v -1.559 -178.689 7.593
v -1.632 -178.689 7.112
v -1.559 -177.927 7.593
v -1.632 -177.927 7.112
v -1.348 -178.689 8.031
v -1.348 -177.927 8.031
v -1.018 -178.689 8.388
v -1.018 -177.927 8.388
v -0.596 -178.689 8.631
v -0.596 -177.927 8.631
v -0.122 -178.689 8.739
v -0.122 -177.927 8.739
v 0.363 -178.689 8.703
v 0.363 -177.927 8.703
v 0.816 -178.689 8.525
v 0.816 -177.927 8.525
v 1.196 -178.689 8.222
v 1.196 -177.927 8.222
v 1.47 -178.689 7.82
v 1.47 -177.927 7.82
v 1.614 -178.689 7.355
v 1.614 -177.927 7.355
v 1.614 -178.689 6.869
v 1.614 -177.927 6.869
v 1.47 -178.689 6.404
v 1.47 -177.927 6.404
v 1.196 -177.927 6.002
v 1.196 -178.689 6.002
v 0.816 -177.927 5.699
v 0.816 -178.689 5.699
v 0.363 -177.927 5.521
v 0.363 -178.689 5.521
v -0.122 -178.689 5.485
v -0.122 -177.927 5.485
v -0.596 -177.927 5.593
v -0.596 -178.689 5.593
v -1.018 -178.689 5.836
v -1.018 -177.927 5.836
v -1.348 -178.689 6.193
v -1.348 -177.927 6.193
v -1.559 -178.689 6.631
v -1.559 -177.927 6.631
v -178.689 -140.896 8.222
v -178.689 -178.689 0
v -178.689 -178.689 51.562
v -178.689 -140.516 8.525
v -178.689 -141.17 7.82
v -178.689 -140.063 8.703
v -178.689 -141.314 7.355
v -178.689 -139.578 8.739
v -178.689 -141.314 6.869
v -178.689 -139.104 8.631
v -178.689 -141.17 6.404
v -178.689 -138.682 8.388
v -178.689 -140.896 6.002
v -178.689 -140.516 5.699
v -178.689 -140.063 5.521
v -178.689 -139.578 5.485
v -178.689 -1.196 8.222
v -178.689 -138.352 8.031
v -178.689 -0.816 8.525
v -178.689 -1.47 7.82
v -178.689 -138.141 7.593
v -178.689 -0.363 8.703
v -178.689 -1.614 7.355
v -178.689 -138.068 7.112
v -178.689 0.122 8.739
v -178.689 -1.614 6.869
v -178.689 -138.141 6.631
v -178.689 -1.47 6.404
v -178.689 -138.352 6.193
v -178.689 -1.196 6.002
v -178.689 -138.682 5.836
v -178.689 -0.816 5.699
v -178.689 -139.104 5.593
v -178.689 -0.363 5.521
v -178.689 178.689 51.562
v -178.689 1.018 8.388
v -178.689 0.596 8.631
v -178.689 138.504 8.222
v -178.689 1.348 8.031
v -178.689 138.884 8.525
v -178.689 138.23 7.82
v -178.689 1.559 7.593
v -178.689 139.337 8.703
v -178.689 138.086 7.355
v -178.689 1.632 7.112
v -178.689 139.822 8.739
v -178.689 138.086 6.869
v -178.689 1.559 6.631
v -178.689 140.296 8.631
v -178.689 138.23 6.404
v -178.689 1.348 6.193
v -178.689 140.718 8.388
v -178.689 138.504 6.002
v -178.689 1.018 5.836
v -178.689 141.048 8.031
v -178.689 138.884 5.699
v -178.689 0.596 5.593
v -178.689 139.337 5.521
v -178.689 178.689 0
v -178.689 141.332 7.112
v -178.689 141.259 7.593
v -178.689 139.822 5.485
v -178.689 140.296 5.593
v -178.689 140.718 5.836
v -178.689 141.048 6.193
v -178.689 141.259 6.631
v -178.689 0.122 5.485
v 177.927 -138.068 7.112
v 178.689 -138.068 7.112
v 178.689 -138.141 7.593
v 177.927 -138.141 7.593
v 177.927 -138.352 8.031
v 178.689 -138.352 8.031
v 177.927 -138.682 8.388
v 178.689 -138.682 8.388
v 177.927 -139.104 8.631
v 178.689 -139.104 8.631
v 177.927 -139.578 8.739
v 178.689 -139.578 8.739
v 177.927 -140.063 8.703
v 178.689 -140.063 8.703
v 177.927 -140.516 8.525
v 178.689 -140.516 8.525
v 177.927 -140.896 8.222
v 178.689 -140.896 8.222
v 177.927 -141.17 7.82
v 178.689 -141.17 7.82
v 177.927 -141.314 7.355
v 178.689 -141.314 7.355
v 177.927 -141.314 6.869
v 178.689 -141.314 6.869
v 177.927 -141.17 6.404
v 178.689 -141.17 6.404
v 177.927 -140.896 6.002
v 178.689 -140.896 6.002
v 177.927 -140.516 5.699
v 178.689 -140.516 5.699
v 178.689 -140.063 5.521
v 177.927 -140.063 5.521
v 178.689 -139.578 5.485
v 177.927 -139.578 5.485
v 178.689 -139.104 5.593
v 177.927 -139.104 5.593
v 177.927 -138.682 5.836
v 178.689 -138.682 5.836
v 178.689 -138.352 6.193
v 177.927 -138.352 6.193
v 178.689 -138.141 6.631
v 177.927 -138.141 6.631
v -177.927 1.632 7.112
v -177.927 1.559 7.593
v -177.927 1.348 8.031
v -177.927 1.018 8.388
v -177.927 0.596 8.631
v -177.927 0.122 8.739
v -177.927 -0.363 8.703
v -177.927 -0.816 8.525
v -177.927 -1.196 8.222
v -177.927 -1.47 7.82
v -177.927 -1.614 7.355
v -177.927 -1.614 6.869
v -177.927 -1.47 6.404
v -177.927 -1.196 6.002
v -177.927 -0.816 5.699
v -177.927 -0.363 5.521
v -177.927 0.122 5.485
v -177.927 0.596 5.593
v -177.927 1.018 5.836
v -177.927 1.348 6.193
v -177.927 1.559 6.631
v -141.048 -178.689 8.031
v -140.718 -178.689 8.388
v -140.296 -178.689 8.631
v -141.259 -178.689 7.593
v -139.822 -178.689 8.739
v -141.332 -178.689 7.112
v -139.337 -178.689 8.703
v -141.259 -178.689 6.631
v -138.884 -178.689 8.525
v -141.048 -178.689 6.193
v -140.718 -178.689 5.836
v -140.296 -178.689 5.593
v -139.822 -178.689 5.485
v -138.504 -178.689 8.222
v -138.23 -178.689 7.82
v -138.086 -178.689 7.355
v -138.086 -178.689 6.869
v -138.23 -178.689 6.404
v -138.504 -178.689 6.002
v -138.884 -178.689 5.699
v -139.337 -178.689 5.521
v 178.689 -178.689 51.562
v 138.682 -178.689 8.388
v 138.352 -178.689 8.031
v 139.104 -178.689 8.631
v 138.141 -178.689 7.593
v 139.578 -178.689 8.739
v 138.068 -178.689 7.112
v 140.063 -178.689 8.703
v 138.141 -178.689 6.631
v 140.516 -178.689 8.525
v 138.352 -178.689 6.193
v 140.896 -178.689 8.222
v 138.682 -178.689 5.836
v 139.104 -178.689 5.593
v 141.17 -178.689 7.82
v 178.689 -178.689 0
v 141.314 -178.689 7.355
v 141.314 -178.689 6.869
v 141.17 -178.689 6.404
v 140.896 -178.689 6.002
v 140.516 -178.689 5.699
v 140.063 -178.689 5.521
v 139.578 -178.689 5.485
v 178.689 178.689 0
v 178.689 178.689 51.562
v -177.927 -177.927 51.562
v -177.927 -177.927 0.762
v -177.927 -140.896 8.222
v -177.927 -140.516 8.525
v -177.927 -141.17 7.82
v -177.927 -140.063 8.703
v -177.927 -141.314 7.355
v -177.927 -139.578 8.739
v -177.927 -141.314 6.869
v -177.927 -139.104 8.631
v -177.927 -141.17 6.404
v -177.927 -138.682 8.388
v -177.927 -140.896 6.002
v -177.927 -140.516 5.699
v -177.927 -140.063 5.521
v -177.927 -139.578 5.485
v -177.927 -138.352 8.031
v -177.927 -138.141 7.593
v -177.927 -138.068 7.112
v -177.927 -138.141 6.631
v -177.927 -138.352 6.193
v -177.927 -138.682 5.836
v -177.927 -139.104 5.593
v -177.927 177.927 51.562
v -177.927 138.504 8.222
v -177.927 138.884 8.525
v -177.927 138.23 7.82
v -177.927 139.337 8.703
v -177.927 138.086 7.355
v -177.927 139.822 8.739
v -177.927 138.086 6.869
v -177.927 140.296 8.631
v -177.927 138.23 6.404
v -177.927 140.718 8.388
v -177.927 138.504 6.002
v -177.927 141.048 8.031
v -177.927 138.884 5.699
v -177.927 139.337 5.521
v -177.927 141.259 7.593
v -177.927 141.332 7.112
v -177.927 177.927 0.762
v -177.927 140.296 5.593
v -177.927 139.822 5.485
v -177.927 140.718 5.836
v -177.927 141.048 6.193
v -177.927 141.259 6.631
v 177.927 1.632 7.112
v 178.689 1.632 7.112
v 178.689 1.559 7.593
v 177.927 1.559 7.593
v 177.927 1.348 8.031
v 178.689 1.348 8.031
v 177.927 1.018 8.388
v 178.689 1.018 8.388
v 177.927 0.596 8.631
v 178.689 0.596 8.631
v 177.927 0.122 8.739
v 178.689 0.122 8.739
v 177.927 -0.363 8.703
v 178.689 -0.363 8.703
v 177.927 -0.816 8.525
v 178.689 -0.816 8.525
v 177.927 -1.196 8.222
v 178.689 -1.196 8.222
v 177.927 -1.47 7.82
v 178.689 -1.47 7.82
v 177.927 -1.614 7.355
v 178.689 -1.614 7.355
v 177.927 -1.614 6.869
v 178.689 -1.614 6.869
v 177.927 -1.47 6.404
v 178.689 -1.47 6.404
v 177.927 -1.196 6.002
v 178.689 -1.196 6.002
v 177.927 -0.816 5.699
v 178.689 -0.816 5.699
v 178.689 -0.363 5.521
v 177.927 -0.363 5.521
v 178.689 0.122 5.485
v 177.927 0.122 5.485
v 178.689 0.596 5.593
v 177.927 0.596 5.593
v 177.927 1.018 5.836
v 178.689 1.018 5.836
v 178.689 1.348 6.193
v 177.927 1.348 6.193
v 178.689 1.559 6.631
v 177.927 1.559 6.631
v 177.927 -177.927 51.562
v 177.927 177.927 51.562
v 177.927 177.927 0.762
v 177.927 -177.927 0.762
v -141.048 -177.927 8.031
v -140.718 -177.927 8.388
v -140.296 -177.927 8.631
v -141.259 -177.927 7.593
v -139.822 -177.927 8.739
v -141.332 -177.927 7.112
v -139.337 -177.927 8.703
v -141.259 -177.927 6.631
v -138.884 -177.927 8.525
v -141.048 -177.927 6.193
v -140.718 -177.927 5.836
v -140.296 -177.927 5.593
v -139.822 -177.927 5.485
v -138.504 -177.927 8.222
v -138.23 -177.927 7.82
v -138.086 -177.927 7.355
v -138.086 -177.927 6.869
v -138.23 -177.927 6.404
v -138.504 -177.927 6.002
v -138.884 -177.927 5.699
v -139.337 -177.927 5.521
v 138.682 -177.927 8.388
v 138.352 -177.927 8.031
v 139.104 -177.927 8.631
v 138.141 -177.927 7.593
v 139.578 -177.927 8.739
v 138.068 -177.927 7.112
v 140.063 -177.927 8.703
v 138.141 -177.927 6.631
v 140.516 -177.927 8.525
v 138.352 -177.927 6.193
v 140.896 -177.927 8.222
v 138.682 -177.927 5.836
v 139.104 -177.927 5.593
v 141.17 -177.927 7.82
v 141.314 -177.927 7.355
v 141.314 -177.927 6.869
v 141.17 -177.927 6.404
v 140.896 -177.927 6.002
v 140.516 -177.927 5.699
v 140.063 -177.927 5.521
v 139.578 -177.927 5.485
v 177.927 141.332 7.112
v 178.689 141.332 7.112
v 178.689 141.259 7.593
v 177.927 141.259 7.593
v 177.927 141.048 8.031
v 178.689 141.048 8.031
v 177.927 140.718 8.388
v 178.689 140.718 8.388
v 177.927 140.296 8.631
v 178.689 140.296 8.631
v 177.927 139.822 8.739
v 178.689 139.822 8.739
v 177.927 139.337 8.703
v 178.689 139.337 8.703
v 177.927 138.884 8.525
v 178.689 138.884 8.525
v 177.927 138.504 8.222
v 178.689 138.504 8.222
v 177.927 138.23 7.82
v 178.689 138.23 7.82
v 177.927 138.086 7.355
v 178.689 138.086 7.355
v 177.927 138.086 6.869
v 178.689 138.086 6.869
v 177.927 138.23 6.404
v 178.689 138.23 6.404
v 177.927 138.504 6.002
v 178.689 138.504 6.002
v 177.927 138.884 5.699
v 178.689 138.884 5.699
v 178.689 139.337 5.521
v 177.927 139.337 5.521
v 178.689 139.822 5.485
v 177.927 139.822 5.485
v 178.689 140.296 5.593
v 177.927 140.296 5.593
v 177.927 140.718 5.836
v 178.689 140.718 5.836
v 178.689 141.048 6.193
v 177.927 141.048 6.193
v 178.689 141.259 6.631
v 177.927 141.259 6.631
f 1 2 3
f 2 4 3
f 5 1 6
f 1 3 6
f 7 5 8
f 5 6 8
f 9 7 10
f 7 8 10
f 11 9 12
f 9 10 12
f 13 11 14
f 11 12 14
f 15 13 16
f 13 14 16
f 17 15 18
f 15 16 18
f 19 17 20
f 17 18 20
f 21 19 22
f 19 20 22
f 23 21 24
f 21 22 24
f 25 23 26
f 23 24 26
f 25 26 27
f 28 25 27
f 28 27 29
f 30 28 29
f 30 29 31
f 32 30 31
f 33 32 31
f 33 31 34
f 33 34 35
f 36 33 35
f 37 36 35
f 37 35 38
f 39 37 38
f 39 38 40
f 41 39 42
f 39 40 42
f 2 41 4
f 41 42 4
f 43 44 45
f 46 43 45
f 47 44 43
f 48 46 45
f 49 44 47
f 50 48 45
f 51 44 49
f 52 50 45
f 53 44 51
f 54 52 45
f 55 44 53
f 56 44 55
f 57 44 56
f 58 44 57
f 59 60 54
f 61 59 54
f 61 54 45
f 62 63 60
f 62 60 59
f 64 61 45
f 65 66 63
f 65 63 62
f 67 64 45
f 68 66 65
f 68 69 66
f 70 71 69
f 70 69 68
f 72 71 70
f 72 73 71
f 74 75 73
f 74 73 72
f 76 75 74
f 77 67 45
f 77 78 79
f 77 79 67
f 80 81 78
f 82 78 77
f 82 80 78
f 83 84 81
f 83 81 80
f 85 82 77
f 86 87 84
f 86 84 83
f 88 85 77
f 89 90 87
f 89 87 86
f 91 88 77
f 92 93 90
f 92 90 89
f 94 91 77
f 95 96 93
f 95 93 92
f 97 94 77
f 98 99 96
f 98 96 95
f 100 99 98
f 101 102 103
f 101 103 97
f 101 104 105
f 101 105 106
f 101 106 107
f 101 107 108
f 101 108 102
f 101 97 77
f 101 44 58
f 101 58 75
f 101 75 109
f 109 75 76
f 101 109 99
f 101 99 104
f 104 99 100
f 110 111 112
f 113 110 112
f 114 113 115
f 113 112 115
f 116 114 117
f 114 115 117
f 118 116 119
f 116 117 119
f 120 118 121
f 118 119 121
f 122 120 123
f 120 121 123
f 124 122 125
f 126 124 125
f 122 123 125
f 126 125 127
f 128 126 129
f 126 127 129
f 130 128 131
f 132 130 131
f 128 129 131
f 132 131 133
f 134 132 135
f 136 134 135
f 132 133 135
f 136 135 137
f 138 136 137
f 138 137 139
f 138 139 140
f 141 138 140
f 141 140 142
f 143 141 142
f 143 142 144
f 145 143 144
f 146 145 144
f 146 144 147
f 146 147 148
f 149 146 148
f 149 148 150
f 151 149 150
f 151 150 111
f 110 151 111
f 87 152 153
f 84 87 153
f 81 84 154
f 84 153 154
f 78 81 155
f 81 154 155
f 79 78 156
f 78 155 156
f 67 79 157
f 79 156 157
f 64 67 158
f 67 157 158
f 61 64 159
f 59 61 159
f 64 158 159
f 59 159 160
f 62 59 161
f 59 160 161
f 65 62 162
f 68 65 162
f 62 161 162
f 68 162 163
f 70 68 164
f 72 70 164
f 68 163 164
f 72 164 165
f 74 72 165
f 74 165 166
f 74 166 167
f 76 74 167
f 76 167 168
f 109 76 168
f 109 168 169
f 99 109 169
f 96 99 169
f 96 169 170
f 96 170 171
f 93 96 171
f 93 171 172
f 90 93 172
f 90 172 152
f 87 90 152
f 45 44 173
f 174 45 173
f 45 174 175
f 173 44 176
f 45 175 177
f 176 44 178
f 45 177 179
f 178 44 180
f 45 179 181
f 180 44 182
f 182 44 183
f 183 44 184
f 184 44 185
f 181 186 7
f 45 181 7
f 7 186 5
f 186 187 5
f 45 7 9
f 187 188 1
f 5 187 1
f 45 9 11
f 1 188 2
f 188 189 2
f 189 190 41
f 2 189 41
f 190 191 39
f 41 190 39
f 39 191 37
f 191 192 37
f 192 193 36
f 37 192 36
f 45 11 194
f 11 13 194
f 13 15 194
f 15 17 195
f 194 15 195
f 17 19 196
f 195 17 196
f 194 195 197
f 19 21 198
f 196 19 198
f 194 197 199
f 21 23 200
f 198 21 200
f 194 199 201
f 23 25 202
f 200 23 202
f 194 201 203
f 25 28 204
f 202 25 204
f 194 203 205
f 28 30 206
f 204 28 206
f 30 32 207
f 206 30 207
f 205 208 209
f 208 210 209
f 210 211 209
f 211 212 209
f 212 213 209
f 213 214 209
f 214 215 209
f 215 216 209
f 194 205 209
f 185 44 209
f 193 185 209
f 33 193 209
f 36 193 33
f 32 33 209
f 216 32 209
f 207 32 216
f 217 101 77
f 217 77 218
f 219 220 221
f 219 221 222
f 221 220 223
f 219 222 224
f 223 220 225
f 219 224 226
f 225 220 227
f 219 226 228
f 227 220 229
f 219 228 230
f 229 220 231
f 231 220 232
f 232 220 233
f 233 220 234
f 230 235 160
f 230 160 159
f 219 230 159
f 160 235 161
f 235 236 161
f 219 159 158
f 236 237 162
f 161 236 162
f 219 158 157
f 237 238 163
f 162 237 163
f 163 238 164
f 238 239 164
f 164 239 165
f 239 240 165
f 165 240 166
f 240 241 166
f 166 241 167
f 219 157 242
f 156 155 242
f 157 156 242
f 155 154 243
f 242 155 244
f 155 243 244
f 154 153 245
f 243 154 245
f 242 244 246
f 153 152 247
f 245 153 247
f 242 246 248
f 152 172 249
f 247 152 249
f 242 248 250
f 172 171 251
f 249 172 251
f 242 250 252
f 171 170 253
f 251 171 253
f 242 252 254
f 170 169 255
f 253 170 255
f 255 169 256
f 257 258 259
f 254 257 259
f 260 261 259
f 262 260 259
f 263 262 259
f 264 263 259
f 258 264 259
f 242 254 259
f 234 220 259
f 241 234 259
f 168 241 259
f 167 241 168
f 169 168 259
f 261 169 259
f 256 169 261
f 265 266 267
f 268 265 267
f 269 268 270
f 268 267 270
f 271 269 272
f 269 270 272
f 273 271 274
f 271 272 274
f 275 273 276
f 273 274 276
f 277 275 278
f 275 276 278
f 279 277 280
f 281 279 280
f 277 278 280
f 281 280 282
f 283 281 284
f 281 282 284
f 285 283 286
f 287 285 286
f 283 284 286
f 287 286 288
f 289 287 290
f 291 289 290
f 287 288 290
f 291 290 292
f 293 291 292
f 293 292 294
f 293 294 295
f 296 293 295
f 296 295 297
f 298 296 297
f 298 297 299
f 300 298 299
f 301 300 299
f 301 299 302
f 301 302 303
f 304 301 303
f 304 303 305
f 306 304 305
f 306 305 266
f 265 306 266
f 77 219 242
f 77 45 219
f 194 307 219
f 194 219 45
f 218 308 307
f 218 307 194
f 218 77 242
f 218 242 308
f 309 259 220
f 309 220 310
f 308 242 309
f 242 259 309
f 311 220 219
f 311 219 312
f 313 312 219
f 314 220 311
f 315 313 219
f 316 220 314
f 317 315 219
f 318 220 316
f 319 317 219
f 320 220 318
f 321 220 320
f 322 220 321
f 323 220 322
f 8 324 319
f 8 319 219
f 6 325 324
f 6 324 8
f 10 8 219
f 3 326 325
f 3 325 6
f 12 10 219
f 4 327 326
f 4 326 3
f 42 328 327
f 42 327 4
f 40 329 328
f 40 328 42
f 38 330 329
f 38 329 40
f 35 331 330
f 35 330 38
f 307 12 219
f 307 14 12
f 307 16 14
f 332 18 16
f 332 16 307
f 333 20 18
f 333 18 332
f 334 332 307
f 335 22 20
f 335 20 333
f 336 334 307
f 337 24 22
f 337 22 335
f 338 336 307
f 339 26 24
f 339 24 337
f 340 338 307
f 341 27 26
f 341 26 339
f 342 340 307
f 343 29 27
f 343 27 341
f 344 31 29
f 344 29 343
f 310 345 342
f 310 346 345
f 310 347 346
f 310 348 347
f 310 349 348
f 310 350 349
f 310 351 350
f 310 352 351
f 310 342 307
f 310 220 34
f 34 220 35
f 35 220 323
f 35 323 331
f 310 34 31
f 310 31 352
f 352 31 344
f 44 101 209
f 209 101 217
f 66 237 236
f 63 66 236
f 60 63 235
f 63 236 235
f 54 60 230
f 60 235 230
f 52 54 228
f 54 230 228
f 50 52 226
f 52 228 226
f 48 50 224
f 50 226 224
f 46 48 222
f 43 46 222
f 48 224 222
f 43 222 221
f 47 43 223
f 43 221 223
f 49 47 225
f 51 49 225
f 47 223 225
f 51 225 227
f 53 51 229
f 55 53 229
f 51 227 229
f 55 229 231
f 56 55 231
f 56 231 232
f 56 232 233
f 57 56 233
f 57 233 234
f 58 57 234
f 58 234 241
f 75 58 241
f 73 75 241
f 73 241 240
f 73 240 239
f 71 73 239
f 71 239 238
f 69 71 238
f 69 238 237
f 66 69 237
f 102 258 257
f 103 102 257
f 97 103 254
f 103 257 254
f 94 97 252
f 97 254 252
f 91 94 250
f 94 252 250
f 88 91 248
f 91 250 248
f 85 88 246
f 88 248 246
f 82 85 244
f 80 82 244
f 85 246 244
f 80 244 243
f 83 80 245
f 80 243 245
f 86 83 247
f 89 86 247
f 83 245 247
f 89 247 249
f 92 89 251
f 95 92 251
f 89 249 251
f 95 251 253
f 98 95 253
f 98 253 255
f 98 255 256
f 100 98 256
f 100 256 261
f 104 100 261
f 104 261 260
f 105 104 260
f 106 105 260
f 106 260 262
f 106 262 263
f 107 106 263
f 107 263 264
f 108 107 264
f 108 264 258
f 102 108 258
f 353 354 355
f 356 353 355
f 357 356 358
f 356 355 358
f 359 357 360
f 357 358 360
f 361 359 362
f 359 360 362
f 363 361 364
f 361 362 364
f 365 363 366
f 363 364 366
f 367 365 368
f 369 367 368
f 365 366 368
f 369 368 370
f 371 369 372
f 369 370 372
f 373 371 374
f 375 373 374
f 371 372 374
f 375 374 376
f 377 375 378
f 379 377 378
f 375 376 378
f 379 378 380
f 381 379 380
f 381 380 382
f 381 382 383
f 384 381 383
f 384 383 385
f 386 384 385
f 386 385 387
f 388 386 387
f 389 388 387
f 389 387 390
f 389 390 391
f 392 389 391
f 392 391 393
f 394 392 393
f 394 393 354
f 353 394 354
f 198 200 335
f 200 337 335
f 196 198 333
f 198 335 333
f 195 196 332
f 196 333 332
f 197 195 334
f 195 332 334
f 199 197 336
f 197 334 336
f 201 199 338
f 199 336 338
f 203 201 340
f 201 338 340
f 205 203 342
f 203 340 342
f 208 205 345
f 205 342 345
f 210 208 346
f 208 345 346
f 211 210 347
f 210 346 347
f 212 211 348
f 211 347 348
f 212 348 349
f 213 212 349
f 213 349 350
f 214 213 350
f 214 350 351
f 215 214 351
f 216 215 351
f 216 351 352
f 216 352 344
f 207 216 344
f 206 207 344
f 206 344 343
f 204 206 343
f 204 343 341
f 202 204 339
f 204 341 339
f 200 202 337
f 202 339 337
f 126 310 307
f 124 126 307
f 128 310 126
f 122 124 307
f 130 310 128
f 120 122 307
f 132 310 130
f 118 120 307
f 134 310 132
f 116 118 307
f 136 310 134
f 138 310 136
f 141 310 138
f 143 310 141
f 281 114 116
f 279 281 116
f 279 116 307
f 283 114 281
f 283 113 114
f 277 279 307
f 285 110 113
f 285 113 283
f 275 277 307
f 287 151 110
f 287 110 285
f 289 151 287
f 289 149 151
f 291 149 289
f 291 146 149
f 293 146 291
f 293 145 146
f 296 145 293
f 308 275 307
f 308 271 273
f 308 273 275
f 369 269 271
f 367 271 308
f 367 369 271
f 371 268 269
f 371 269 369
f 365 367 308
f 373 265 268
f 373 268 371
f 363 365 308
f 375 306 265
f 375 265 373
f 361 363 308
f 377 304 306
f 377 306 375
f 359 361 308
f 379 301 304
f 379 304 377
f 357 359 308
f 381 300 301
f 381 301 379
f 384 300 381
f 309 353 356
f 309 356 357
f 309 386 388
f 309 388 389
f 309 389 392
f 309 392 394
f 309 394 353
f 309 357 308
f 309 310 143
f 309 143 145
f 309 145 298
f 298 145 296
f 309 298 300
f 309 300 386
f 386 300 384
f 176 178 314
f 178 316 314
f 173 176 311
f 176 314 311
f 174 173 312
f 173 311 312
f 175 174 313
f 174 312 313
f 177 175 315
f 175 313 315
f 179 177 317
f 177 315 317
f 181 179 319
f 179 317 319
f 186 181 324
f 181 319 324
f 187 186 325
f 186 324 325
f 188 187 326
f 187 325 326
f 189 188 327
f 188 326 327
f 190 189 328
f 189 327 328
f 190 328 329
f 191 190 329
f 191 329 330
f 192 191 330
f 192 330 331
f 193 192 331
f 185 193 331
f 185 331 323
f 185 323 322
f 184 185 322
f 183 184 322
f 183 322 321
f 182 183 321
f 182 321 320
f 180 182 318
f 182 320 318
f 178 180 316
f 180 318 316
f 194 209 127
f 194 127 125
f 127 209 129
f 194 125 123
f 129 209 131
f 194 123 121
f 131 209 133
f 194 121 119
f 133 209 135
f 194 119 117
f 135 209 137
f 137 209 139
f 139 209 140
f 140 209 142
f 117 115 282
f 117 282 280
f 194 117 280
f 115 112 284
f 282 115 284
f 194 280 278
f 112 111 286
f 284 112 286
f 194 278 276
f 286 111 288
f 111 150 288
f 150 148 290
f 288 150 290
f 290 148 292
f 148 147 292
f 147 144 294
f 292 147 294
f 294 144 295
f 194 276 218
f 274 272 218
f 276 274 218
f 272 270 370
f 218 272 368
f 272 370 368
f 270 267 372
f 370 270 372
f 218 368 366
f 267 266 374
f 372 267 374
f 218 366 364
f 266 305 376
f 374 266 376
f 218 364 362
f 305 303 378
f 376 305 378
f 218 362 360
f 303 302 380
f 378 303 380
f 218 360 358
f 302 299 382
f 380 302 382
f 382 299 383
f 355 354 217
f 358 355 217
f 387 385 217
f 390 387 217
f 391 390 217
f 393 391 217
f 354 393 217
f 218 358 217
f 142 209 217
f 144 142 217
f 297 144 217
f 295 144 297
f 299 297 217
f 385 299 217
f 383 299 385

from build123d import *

# Parameters (mm, degrees)
F0_W     = 357.378
F0_H     = 357.378
F1_DEPTH = 51.562
F2_T     = -0.762
F4_D     = 3.2639
F4_DEPTH = 0.762
F4_TIP   = 0.9805744872
F6_D     = 3.2639


with BuildPart() as f1:
    # F0 (on Top) → F1 (new body)
    with BuildSketch(Plane.XY):
        Rectangle(F0_W, F0_H)
    extrude(amount=F1_DEPTH)

    # F2
    f2_openings = [f1.faces().sort_by_distance(p)[0] for p in [
        (0, 0, 51.562),
    ]]
    offset(amount=F2_T, openings=f2_openings)

    # F4
    with Locations(Plane.XZ.offset(178.689)):
        with Locations((139.7, 7.112), (0, 7.112), (-139.7, 7.112)):
            Hole(F4_D / 2, depth=F4_DEPTH)
            with Locations((0, 0, -(F4_DEPTH + F4_TIP / 2))):  # 118° drill point
                Cone(0, F4_D / 2, F4_TIP, mode=Mode.SUBTRACT)

    # F6 (through all)
    with Locations(Plane(origin=(-178.689, 0, 0), x_dir=(0, -1, 0), z_dir=(-1, 0, 0))):
        with Locations((-139.7, 7.112), (0, 7.112), (139.7, 7.112)):
            Hole(F6_D / 2)


solid = f1.part
